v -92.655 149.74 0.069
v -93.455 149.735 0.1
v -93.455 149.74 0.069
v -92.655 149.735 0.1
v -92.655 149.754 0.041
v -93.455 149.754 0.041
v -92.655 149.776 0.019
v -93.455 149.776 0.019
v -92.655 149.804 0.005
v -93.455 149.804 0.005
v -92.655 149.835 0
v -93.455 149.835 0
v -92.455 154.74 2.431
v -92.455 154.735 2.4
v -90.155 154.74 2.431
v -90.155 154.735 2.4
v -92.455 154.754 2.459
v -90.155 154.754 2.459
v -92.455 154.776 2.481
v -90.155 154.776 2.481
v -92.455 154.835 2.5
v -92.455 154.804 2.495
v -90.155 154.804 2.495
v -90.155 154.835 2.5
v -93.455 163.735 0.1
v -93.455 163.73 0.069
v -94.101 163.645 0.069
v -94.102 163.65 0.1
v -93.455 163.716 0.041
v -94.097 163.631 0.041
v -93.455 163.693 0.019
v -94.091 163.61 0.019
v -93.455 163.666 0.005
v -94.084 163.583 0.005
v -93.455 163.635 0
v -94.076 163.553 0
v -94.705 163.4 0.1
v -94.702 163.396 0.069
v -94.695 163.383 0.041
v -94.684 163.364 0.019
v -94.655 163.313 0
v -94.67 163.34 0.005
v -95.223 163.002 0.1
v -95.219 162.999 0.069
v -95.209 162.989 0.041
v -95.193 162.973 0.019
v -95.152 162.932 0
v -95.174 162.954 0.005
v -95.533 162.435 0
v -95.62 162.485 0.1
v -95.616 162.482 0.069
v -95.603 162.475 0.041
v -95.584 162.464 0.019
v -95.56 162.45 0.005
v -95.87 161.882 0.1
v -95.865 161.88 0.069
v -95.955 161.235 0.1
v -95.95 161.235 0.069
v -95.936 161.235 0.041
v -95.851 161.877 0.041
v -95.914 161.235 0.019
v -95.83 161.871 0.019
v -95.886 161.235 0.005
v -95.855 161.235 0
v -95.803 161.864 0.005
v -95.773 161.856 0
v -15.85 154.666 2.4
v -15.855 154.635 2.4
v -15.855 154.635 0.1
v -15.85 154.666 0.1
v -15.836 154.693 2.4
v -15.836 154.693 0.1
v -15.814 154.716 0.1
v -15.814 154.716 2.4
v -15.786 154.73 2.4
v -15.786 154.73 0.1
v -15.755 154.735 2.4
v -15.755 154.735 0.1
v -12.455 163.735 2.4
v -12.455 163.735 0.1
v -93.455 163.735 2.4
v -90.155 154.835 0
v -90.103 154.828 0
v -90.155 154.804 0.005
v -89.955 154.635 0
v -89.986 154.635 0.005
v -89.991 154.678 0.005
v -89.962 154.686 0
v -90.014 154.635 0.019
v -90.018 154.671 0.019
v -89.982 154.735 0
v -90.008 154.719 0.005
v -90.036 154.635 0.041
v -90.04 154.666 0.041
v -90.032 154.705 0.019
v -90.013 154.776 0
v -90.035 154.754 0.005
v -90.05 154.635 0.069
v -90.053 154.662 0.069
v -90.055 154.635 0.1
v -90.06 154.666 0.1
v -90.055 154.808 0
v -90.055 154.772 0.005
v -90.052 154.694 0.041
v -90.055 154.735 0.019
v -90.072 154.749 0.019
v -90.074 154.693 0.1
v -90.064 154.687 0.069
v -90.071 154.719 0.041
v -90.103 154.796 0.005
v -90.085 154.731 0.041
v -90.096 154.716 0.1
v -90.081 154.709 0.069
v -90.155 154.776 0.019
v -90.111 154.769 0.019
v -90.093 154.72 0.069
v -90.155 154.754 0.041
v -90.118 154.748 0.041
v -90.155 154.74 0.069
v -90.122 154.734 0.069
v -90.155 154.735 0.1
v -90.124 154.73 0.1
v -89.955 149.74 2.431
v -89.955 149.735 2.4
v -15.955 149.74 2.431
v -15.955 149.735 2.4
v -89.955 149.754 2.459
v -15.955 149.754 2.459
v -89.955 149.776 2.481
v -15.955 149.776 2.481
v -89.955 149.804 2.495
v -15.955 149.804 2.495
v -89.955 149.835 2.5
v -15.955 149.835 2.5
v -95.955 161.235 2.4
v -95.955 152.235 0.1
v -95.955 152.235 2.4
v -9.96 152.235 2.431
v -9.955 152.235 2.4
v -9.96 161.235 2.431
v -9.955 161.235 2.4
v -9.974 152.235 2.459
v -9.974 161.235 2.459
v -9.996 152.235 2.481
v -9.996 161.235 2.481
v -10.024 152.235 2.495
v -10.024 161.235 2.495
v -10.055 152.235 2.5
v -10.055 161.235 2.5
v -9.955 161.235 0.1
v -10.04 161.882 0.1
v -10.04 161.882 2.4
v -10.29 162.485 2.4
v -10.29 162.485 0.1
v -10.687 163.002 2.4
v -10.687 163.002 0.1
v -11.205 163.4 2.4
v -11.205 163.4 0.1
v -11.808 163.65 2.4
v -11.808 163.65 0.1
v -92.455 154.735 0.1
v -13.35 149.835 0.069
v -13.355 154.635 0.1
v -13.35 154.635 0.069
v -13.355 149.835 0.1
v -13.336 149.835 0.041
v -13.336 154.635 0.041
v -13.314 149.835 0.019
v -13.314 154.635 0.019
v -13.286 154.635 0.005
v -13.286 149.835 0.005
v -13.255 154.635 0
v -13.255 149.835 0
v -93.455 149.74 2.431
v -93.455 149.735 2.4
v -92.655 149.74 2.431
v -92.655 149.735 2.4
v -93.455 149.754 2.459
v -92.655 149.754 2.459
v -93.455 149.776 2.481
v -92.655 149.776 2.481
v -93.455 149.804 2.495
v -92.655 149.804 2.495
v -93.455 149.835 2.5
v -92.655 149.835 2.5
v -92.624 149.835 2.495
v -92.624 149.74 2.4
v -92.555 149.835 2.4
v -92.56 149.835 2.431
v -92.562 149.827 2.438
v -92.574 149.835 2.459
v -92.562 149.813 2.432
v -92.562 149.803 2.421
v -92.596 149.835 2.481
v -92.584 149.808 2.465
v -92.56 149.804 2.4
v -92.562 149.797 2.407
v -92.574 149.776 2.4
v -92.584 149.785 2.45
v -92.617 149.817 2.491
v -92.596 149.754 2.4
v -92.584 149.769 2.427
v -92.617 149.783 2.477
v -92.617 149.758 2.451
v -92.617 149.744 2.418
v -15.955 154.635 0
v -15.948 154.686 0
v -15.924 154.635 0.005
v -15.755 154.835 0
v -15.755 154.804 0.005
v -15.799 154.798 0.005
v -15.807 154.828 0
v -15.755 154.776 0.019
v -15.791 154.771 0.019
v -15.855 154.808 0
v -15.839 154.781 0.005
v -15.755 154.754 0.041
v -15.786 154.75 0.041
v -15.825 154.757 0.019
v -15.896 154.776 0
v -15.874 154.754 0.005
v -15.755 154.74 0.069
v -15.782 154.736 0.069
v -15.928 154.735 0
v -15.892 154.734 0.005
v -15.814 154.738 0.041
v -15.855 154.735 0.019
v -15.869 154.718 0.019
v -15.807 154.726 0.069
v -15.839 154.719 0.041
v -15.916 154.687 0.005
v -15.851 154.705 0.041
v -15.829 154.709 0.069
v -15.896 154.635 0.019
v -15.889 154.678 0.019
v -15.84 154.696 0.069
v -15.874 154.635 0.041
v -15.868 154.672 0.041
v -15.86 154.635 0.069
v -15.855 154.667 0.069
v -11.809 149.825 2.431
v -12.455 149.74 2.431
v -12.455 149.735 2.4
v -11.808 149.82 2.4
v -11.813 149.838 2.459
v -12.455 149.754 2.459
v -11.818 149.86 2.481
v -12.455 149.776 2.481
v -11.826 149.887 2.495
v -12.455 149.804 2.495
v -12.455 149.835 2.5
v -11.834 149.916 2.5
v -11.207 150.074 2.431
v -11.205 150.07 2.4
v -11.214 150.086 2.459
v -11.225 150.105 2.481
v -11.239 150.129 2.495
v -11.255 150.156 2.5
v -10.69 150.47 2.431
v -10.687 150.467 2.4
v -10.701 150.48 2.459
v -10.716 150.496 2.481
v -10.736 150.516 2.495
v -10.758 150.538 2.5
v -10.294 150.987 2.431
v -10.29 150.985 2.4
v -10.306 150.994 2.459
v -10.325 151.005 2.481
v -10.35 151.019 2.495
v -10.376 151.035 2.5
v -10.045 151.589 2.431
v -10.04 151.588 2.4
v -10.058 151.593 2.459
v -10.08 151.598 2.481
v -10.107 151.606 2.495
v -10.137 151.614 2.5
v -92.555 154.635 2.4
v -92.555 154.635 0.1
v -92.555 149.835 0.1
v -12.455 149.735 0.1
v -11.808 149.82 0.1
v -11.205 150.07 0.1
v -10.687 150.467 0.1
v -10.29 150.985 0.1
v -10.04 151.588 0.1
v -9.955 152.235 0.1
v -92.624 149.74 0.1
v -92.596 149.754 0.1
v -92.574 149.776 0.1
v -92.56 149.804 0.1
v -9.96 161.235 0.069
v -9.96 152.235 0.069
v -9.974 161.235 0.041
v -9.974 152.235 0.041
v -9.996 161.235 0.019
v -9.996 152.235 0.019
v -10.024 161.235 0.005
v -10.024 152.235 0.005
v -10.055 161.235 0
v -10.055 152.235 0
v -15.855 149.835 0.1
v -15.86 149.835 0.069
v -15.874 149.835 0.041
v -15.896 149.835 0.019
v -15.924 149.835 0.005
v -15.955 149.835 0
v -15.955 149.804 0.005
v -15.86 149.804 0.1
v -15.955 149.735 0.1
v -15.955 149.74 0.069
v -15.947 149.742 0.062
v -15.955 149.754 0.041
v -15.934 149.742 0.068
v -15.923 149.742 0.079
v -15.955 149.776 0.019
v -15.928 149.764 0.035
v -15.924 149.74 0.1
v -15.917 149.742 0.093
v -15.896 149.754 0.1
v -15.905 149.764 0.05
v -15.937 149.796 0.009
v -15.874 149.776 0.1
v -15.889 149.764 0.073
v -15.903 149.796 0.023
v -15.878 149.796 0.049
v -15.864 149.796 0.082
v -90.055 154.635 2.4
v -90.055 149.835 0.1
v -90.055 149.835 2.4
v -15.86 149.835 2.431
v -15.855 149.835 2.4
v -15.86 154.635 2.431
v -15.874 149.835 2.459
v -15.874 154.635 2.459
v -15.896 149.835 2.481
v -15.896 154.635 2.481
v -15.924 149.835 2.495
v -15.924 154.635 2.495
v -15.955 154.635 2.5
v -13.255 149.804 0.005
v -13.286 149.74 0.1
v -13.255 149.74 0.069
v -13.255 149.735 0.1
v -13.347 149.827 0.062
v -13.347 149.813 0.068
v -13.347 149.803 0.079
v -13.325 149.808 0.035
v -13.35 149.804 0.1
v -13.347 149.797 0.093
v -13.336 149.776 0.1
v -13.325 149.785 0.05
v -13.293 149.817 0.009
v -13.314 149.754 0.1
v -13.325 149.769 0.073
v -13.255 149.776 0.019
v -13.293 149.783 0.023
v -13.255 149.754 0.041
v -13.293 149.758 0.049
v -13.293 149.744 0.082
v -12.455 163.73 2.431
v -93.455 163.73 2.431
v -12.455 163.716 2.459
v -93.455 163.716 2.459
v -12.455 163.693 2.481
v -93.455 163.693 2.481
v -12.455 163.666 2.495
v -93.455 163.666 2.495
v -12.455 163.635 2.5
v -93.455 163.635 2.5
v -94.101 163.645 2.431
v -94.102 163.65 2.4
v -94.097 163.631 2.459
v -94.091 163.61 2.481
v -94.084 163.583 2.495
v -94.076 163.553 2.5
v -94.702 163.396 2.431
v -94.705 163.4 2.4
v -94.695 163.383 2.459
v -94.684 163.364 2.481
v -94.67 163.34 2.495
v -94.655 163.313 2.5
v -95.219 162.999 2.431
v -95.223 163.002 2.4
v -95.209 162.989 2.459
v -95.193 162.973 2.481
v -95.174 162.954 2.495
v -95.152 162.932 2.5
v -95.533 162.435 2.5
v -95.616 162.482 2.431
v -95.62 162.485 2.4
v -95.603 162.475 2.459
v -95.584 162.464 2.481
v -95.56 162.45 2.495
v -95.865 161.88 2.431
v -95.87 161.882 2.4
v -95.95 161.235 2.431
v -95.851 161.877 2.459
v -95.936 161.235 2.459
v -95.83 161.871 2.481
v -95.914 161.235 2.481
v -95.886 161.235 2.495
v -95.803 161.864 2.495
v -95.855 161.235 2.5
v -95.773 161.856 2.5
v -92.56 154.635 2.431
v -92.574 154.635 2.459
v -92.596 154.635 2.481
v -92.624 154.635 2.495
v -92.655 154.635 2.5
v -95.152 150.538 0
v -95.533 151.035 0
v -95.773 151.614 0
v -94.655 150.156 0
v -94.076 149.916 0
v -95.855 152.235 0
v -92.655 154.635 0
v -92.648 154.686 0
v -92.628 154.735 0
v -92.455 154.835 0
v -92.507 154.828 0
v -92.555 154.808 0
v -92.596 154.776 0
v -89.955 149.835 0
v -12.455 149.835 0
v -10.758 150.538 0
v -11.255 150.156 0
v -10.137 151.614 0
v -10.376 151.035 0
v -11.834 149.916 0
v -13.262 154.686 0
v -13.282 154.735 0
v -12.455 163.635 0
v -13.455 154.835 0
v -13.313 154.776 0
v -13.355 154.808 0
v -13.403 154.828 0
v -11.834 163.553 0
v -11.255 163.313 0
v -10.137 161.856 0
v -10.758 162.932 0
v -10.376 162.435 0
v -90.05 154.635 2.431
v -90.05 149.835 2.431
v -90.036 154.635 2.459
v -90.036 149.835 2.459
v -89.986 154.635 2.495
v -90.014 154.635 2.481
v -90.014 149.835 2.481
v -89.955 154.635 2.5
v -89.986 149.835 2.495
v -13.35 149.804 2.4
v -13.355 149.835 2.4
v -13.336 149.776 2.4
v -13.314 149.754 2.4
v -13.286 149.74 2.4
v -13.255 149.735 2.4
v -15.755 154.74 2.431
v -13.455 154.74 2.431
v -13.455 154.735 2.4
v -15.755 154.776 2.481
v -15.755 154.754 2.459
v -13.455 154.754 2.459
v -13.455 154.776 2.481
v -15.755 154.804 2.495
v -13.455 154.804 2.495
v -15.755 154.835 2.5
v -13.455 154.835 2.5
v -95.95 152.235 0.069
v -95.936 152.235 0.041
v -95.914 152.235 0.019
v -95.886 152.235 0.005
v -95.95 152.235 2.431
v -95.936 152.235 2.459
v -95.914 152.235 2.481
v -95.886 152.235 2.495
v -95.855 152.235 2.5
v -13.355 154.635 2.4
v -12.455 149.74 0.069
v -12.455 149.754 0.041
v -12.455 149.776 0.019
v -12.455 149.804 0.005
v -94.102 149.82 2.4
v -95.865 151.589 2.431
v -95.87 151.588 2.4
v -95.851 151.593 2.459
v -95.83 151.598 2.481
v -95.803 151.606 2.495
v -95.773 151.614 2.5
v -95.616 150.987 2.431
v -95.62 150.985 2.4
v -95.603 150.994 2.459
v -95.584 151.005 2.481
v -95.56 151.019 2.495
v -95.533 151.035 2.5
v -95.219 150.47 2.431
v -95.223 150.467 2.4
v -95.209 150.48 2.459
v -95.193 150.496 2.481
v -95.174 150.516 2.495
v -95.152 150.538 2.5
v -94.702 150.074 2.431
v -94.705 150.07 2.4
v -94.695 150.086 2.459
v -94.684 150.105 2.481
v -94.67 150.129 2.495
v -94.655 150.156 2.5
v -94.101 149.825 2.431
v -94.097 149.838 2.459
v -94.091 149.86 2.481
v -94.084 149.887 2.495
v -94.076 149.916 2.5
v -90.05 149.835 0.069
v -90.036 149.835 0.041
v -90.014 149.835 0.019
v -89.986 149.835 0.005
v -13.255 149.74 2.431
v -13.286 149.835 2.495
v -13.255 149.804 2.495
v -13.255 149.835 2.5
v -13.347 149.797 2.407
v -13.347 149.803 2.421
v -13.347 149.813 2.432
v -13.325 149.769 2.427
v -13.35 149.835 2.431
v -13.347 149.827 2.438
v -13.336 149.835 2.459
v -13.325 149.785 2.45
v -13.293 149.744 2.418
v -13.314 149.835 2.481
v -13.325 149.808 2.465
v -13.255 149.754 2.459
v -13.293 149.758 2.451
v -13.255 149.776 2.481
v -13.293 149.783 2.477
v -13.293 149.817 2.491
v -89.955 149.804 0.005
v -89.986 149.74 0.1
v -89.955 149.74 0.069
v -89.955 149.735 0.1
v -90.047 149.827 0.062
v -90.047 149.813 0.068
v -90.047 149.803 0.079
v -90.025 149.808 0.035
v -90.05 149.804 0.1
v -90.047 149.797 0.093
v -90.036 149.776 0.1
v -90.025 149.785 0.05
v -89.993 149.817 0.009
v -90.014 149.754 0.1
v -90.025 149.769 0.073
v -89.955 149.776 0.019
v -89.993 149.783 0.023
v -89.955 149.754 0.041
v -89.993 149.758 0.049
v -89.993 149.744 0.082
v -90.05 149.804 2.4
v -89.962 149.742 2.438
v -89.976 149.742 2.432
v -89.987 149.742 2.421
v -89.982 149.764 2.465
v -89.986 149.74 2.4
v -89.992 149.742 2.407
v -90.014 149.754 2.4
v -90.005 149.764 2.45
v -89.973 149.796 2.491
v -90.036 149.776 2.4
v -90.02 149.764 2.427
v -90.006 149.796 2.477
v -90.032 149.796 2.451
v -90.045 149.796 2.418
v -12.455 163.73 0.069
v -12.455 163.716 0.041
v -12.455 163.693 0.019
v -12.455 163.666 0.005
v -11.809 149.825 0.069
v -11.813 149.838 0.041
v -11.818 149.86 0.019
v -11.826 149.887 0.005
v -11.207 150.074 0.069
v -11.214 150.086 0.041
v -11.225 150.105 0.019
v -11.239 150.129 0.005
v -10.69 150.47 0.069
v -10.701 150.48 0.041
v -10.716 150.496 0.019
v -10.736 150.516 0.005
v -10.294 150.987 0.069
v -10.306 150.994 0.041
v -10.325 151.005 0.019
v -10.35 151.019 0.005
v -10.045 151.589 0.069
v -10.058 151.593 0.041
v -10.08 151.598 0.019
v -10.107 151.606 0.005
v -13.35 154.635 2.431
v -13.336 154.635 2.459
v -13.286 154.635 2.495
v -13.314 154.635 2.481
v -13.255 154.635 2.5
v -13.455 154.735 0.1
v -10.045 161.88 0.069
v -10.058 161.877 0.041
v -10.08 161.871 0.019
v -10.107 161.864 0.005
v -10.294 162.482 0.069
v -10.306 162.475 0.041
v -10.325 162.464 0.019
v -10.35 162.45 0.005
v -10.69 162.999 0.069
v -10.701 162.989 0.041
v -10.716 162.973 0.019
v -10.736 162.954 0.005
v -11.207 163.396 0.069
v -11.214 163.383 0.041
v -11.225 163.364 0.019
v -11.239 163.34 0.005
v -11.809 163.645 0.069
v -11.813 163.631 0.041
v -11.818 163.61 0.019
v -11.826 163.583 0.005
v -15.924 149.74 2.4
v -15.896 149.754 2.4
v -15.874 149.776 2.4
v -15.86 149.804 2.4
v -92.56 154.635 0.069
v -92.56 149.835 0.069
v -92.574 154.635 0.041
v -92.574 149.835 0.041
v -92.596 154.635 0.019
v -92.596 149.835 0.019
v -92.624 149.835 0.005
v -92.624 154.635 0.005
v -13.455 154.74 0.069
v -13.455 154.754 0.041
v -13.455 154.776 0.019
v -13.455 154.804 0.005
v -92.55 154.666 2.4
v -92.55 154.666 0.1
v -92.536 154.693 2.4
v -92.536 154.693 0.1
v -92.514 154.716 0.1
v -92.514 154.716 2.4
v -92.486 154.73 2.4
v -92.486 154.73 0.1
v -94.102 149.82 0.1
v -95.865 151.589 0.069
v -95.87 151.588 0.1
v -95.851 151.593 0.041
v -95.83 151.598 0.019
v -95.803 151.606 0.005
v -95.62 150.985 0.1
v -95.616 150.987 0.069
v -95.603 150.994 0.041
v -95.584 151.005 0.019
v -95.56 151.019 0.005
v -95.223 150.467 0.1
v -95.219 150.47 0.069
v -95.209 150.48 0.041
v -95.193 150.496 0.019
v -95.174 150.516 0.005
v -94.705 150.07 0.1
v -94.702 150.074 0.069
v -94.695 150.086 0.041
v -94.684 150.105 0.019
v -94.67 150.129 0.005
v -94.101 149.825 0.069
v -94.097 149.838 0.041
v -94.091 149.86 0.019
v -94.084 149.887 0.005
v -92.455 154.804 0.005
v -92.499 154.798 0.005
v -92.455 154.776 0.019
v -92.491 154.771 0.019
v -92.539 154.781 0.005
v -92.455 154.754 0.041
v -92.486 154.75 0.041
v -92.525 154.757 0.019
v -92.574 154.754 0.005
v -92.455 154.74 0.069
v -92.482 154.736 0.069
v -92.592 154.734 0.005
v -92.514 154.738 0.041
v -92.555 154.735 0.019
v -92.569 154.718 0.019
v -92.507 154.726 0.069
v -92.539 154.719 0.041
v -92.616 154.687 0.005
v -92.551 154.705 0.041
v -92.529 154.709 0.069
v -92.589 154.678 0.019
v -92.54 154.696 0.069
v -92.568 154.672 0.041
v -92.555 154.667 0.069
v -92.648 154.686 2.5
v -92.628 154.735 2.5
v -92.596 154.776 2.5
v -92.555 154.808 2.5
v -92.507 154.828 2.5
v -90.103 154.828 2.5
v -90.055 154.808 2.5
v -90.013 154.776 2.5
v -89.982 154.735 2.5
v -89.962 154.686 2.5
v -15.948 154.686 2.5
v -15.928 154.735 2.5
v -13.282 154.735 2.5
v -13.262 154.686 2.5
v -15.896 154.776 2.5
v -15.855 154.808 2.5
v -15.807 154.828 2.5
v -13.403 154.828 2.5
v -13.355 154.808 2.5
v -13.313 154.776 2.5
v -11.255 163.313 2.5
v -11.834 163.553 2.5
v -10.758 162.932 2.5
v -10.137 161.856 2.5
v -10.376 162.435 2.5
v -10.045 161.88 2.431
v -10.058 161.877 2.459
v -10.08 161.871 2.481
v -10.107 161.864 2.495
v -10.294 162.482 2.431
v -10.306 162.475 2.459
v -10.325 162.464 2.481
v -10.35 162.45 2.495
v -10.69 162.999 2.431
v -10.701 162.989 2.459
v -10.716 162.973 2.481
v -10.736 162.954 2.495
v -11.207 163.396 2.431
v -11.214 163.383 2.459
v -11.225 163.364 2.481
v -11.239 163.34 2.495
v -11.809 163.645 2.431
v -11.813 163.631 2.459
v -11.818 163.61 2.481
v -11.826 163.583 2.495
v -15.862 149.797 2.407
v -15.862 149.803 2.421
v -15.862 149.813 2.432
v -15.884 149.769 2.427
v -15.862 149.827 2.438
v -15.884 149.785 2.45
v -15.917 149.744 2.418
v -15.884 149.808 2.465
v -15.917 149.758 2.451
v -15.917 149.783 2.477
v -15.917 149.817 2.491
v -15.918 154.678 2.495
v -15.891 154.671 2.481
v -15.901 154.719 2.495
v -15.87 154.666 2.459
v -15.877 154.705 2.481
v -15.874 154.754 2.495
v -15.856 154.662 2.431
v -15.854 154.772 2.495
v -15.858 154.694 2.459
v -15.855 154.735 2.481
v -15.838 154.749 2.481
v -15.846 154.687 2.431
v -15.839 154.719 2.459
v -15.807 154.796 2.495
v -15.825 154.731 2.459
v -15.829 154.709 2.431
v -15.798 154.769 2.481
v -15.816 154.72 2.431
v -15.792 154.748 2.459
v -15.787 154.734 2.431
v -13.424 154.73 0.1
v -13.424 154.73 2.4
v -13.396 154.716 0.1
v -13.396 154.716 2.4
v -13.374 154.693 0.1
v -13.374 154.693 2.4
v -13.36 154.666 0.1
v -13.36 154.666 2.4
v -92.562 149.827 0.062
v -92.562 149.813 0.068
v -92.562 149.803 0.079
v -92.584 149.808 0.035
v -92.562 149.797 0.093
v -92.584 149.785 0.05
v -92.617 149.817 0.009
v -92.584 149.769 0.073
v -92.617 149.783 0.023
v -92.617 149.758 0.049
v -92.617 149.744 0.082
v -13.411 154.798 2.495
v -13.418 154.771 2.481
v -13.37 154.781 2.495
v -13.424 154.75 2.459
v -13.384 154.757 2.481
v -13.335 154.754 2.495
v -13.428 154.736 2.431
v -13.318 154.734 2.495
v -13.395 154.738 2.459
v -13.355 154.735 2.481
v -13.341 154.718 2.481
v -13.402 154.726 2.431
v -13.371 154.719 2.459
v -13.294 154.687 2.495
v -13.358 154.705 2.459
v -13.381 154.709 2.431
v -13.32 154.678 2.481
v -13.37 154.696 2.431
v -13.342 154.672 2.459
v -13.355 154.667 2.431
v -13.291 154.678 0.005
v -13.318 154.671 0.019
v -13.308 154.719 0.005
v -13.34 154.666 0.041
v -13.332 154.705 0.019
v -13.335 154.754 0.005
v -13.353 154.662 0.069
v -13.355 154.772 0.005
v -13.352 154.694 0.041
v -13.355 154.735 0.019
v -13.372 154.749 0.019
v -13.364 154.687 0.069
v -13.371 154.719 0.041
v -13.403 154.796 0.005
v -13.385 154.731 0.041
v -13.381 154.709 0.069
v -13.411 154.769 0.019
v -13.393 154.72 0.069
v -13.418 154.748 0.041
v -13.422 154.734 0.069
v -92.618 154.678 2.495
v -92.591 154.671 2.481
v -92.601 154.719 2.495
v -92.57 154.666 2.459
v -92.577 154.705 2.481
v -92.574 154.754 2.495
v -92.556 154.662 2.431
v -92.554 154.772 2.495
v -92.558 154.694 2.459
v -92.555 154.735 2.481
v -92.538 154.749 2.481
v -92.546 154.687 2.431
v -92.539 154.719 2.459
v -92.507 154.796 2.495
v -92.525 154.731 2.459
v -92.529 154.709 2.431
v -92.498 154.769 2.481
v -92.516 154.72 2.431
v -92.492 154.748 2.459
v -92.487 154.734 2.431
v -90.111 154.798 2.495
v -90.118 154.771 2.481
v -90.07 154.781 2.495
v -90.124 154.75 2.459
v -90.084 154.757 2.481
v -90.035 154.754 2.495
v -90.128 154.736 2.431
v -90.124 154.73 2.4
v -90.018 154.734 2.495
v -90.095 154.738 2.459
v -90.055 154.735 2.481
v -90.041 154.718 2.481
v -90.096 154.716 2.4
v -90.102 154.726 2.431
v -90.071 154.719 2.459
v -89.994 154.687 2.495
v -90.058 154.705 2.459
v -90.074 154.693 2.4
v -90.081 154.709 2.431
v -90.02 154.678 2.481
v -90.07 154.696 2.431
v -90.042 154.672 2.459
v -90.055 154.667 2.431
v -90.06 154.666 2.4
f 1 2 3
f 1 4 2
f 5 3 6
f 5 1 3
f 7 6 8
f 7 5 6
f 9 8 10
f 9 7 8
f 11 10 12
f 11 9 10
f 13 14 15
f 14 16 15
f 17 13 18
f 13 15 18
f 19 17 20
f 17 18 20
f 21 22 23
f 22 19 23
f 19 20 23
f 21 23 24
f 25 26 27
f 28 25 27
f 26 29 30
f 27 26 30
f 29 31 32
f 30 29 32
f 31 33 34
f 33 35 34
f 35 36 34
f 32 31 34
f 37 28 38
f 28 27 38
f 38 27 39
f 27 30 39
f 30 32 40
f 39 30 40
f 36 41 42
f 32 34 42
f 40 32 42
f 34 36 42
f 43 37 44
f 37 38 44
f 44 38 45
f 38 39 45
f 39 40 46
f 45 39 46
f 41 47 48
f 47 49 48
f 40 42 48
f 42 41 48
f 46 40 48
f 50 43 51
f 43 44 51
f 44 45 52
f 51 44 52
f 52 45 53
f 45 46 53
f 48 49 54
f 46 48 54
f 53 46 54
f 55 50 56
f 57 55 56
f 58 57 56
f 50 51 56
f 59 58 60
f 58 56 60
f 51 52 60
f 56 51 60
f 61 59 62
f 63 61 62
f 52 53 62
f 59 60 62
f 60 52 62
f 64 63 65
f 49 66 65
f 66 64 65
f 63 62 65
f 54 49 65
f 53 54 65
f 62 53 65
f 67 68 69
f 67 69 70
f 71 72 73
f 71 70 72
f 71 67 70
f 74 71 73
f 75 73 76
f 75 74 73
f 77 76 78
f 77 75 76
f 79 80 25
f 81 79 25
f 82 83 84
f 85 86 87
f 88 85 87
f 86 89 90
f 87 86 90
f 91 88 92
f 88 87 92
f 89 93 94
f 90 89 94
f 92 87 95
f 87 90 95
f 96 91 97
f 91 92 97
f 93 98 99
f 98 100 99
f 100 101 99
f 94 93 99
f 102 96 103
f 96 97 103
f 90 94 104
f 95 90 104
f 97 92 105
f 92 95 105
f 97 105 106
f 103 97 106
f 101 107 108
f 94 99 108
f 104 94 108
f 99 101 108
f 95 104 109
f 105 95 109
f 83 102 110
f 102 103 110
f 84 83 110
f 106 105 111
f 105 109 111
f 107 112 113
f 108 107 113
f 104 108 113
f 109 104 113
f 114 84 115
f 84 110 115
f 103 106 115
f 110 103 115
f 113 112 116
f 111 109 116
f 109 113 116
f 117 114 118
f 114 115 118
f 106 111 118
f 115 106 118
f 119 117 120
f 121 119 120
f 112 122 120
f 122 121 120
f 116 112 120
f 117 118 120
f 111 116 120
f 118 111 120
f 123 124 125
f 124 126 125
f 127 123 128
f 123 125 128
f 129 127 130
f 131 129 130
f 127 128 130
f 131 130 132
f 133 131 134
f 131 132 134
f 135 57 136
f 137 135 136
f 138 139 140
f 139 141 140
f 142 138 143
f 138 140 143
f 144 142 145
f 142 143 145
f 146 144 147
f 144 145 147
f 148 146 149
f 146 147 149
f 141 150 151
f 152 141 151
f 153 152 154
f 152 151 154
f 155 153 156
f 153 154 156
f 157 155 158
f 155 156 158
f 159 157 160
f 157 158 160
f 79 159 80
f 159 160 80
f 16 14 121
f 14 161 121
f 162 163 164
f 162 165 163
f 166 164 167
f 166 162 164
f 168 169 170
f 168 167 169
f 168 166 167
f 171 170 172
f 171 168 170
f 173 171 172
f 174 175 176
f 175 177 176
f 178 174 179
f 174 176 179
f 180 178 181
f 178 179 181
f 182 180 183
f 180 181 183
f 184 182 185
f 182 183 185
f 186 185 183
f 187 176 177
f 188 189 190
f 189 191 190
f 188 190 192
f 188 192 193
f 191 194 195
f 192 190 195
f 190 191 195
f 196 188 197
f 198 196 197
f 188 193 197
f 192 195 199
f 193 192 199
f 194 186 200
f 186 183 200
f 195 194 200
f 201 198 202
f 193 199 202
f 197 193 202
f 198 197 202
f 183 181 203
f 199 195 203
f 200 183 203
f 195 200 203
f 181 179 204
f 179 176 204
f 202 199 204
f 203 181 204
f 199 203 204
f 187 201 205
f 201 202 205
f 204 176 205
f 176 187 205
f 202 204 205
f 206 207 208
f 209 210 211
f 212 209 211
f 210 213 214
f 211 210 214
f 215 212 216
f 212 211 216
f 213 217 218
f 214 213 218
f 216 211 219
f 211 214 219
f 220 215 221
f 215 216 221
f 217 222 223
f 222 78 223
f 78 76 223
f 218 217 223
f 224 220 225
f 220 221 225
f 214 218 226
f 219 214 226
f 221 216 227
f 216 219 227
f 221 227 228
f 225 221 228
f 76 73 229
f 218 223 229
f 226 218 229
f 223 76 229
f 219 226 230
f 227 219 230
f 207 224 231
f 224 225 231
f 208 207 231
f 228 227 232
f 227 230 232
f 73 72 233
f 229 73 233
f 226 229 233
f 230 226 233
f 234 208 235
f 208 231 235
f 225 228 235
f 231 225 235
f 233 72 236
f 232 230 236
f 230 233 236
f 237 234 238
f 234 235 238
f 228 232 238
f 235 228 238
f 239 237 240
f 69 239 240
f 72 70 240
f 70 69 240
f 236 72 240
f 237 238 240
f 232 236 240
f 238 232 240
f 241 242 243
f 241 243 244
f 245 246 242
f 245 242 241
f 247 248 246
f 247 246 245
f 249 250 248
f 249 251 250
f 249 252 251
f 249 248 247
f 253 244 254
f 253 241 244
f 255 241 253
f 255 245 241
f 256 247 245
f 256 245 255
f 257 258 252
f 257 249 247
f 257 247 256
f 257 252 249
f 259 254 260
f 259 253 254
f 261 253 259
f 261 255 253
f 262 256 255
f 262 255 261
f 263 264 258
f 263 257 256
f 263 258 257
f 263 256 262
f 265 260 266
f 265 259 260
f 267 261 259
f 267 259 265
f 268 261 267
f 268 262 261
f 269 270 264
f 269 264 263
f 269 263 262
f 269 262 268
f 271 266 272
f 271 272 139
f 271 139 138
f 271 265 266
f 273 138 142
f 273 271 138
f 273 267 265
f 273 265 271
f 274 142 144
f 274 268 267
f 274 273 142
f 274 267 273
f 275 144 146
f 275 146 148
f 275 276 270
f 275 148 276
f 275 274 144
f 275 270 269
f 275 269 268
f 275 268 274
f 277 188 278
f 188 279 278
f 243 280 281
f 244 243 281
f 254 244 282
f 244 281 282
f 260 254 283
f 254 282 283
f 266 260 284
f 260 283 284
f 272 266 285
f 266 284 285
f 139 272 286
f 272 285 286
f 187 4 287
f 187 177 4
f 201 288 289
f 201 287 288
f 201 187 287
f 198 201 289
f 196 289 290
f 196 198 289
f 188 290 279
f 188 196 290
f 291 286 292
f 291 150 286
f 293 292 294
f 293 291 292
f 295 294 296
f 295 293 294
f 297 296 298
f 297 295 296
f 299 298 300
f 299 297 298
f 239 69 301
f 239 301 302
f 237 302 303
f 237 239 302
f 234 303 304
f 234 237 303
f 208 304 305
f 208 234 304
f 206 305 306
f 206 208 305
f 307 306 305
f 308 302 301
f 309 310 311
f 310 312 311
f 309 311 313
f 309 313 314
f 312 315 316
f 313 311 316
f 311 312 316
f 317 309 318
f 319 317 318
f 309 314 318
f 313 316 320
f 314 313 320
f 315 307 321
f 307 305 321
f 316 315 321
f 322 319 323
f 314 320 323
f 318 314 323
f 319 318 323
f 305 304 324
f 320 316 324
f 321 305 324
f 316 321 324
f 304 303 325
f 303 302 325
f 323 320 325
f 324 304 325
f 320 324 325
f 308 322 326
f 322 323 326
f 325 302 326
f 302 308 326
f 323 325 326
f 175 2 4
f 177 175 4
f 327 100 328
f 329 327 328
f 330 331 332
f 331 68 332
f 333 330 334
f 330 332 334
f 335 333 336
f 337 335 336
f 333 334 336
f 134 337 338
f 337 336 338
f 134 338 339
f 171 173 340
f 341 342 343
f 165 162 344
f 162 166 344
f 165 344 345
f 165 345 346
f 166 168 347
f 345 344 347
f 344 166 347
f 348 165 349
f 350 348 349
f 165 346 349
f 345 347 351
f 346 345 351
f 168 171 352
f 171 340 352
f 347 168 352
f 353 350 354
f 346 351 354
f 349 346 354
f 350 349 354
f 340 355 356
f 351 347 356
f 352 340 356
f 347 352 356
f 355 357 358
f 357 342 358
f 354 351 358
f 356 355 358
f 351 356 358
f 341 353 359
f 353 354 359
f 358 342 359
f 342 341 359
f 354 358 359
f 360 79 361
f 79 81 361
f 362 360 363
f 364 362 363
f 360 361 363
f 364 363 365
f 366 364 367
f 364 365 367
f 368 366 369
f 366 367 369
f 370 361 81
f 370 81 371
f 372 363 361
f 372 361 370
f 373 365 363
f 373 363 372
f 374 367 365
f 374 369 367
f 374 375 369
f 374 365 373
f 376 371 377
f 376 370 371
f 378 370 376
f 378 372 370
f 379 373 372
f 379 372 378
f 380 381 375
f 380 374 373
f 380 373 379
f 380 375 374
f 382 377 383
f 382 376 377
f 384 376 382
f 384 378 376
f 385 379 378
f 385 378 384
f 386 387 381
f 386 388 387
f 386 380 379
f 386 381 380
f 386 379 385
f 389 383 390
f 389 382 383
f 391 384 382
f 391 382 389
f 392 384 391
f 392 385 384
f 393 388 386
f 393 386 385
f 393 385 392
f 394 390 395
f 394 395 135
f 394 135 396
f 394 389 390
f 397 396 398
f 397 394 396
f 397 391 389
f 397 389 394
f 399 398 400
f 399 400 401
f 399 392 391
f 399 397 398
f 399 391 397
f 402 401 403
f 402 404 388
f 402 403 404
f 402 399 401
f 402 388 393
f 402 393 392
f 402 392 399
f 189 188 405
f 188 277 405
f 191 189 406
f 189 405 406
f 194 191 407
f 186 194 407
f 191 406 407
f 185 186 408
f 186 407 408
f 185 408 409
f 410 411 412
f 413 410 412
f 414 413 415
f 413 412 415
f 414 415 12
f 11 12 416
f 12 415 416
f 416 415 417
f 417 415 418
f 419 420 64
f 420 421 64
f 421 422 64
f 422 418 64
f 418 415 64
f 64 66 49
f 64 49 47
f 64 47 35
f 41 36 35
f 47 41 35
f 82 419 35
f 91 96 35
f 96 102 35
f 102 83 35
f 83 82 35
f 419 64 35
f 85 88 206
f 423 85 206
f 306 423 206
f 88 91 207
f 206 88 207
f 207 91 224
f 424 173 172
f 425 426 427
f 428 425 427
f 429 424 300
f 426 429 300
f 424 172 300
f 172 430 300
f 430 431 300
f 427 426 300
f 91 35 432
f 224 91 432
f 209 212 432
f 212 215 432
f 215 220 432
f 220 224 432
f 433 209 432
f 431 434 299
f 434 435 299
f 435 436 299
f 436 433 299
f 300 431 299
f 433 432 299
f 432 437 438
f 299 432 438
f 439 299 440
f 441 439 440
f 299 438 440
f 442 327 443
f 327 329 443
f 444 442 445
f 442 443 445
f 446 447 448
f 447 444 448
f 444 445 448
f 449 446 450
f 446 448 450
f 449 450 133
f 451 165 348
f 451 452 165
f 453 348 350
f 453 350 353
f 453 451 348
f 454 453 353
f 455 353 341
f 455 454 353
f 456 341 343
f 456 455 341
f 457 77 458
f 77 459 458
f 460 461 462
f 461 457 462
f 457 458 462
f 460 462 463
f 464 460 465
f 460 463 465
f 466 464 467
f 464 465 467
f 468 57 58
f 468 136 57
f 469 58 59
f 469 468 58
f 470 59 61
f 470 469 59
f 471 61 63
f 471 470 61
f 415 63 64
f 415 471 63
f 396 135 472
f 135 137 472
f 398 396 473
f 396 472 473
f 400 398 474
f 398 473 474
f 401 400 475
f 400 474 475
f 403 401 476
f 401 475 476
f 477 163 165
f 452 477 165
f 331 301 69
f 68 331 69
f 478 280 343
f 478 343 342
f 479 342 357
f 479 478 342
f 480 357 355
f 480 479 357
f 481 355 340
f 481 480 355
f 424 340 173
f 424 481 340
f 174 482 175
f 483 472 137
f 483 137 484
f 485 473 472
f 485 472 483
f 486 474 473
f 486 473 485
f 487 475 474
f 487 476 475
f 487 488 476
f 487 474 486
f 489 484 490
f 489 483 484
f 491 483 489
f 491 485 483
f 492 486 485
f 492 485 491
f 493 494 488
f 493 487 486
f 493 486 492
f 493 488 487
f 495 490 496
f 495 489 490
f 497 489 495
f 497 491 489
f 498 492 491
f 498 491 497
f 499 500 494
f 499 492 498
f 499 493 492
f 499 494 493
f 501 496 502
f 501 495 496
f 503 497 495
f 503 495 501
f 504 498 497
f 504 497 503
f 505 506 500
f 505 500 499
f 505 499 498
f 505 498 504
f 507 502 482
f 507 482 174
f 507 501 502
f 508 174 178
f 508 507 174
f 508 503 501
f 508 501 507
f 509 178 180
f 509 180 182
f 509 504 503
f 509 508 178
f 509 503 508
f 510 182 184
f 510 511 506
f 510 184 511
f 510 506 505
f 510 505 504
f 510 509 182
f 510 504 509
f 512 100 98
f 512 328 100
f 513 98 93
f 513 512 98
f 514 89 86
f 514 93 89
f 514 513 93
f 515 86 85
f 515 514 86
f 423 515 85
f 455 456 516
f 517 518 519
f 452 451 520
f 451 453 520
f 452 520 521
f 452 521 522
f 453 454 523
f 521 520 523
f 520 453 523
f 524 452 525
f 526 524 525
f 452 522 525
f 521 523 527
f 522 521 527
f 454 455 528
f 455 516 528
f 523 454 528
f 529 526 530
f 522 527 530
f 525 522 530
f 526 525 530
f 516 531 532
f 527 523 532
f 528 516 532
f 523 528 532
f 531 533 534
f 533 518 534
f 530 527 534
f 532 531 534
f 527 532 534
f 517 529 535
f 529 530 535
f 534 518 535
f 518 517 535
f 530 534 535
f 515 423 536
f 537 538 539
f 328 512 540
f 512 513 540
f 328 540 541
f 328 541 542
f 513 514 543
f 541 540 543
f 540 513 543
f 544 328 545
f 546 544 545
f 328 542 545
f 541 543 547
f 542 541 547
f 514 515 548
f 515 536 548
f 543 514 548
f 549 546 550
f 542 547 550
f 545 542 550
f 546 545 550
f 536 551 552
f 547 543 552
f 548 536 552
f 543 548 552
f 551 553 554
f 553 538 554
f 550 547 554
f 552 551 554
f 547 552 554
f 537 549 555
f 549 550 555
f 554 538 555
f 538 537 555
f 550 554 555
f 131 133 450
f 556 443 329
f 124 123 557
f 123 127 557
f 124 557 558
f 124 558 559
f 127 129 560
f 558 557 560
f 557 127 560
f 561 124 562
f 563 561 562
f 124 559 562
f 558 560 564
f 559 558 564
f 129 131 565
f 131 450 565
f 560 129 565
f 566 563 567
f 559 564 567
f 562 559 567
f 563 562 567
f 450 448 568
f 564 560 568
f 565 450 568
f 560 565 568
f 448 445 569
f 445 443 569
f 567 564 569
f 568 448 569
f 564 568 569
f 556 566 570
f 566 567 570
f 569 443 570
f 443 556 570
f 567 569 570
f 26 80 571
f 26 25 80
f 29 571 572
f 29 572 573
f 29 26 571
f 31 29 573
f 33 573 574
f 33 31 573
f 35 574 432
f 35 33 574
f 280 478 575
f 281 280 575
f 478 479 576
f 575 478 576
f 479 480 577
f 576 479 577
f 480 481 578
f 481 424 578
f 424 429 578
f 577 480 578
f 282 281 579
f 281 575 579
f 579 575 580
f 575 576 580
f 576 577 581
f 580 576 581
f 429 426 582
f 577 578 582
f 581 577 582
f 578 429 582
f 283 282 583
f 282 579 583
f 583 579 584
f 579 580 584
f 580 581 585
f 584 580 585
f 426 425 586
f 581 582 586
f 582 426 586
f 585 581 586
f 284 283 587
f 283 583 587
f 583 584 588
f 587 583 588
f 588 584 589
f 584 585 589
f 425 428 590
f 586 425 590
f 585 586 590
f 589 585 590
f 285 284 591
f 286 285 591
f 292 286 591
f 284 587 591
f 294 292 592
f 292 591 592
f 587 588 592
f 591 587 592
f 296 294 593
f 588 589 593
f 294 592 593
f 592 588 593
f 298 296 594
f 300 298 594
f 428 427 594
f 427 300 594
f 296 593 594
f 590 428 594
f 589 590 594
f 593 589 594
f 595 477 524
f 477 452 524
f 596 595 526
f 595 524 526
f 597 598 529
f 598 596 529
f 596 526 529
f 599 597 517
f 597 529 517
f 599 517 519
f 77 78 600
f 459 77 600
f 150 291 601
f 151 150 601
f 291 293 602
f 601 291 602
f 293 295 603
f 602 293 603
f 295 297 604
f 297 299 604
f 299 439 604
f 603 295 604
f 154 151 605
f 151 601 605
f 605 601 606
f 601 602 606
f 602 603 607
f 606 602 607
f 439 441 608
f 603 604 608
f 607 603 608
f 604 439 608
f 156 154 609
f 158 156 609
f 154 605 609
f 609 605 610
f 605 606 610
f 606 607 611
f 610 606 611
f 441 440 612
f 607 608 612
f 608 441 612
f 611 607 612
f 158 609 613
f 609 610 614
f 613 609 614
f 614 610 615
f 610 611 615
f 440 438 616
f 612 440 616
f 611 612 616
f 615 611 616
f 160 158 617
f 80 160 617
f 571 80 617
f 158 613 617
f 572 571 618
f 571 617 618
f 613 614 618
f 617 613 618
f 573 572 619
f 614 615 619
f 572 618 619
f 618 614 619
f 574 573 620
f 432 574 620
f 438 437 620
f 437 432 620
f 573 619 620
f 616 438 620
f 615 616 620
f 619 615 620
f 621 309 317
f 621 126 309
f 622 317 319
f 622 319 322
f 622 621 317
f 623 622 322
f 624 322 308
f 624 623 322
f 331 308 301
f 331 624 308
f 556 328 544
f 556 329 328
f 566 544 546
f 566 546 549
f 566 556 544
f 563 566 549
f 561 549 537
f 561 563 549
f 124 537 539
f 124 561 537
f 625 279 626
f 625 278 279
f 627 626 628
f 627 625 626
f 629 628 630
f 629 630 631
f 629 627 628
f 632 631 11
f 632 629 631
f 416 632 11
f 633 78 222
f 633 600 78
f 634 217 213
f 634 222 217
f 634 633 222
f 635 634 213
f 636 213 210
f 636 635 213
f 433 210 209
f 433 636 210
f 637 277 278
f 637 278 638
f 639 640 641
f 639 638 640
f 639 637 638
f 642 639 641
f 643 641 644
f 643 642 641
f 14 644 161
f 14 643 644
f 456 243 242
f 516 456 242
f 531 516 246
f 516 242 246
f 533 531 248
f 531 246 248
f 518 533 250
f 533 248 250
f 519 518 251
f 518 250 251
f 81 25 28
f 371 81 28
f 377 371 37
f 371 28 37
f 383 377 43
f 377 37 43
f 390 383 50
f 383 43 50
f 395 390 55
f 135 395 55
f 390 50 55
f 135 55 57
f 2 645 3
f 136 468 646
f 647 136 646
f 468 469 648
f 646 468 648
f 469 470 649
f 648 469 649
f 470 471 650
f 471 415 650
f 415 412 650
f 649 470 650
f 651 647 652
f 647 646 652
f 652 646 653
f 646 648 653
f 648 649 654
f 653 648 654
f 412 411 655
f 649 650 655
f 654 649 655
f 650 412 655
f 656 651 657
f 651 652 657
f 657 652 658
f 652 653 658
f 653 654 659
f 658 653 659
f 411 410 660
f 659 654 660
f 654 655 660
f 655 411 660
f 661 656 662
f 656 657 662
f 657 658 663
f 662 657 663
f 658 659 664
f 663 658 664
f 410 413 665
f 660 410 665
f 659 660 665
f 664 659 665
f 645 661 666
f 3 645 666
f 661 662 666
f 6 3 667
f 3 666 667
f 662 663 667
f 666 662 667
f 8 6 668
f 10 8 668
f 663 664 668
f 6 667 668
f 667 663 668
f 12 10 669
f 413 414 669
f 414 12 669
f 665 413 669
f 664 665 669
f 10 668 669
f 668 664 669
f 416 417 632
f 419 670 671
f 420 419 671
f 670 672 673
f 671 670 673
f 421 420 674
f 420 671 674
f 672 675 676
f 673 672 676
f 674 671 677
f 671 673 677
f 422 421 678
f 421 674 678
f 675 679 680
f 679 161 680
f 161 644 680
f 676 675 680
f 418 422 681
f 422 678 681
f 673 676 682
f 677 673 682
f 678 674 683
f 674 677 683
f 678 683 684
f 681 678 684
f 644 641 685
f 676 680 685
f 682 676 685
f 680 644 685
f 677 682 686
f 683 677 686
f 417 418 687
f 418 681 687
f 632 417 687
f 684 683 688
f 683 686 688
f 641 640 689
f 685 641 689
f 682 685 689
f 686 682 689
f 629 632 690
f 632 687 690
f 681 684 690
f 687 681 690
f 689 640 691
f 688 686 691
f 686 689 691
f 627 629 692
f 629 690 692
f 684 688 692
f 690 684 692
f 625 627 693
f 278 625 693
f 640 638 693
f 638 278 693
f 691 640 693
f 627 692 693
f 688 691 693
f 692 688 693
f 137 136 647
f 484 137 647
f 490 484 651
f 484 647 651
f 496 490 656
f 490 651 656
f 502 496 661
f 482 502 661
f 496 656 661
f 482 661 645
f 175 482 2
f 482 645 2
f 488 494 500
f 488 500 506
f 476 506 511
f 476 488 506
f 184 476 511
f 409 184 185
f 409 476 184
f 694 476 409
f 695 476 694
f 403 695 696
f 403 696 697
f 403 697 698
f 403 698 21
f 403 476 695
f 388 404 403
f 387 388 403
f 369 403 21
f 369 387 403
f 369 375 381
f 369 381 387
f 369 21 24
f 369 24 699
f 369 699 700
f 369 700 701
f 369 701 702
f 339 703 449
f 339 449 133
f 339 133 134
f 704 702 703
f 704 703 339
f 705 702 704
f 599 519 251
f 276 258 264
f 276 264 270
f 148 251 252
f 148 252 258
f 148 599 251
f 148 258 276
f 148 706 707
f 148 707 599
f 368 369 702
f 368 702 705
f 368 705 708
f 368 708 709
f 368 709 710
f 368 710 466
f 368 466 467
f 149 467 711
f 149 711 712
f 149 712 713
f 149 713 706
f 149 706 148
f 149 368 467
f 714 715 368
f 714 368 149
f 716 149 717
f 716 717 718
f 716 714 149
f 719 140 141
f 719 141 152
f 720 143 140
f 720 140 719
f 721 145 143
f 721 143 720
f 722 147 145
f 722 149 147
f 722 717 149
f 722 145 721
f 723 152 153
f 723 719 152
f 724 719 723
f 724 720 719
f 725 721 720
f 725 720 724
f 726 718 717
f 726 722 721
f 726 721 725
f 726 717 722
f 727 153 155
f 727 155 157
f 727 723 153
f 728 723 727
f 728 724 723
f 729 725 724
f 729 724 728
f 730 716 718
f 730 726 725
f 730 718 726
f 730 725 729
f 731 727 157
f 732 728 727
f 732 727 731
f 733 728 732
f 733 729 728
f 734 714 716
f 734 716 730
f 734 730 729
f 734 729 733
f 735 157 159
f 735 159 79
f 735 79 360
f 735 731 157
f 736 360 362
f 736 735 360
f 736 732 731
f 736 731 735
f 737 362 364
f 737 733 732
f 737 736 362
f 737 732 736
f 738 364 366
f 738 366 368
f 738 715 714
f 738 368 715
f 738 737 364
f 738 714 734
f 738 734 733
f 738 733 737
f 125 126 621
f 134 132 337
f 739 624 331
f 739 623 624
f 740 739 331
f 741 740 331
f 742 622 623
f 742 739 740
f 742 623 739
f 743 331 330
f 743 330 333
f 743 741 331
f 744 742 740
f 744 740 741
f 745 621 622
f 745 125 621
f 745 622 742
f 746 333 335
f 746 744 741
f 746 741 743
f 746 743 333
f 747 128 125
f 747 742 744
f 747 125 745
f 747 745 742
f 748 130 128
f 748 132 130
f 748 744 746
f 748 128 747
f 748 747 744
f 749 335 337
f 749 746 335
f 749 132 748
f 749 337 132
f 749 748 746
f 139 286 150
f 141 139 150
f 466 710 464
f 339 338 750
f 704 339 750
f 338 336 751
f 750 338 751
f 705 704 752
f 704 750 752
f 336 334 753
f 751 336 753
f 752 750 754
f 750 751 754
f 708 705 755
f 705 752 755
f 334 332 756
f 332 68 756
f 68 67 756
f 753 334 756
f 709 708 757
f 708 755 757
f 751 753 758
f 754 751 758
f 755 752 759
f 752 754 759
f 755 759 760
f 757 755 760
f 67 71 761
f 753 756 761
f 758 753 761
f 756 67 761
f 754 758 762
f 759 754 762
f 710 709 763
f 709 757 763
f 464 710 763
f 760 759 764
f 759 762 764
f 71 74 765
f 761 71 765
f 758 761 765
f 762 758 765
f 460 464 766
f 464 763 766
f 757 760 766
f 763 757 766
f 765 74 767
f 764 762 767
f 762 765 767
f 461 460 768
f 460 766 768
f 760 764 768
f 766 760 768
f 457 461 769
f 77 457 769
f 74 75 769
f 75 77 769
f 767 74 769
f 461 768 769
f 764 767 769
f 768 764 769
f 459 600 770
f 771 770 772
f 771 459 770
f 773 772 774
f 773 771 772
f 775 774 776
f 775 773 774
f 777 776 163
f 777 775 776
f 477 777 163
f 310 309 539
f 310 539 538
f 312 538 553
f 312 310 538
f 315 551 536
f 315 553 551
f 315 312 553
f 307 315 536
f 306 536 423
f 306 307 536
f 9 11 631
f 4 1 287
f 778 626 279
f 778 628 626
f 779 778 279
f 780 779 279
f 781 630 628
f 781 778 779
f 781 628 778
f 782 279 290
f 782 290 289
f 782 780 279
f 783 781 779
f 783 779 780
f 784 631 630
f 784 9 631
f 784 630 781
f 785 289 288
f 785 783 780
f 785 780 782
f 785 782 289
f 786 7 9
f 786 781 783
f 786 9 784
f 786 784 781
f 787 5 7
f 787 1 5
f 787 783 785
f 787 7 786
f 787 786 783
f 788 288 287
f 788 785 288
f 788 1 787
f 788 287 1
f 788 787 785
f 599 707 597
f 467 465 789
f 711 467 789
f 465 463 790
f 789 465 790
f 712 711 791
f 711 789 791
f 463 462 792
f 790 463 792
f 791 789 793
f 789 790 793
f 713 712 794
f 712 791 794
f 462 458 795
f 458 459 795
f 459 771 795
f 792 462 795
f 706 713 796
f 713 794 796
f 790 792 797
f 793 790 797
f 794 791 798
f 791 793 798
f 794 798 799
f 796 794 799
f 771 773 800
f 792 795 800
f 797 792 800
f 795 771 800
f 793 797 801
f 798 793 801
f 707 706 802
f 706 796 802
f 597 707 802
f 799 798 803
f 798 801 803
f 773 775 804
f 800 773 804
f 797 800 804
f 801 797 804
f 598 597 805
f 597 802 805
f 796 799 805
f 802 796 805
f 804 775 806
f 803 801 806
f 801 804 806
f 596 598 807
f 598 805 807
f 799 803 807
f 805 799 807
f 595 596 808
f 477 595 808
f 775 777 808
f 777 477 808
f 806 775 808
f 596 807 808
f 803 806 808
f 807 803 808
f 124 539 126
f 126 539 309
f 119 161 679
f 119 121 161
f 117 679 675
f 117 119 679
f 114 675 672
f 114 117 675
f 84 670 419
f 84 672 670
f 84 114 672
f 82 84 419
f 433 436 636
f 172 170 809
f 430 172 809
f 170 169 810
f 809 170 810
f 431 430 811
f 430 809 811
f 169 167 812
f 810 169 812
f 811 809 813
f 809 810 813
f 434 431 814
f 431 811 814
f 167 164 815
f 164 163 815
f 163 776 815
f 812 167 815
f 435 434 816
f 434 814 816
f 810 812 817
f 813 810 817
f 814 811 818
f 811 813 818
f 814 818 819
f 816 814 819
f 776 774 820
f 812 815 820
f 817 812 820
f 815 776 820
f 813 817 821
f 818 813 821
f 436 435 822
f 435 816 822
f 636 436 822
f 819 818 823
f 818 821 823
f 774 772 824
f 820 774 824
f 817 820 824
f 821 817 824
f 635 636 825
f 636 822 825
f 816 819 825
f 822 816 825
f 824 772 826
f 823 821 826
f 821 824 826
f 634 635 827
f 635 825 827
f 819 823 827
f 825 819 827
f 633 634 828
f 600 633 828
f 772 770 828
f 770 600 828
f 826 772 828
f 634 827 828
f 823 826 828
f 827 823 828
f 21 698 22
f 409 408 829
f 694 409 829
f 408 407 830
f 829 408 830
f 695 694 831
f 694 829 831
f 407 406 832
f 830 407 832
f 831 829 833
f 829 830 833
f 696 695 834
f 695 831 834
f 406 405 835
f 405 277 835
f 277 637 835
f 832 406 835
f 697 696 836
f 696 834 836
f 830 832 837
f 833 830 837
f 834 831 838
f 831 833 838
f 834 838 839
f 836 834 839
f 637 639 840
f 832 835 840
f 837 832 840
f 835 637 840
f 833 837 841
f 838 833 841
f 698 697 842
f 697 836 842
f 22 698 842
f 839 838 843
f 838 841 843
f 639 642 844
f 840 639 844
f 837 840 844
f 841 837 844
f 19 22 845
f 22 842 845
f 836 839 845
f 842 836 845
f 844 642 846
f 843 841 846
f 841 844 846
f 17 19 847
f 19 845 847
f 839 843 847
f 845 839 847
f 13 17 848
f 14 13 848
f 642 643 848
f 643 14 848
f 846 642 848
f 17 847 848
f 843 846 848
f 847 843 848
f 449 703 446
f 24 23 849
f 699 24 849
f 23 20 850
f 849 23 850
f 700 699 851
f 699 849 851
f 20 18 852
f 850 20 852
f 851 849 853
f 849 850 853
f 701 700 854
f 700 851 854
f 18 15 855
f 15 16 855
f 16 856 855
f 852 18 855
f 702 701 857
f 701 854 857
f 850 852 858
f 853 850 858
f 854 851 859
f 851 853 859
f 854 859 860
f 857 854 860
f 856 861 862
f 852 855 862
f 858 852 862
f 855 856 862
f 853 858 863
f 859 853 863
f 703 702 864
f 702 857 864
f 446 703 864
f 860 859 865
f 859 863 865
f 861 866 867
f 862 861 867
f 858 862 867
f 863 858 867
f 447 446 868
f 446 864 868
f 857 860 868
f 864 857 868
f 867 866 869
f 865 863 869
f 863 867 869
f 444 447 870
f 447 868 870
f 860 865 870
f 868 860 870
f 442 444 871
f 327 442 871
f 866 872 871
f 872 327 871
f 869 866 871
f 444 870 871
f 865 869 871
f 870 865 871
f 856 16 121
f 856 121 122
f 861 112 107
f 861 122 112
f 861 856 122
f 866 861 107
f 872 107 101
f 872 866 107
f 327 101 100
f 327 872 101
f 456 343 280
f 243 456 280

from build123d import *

# Parameters (mm, degrees)
RESSALTO_EXTRUS_O1_DEPTH = 2.5
FILETE1_R                = 0.1


with BuildPart() as part:
    # Esboço1 → Ressalto-extrusão1 (new body)
    with BuildSketch(Plane.XY):
        with BuildLine():
            Line((-12.454787307, 163.73471538), (-93.454787307, 163.73471538))
            ThreePointArc((-93.454787307, 163.73471538), (-95.22255426, 163.002482333), (-95.954787307, 161.23471538))
            Line((-95.954787307, 161.23471538), (-95.954787307, 152.23471538))
            ThreePointArc((-95.954787307, 152.23471538), (-95.22255426, 150.466948427), (-93.454787307, 149.73471538))
            Line((-93.454787307, 149.73471538), (-92.554787307, 149.73471538))
            Line((-92.554787307, 149.73471538), (-92.554787307, 154.73471538))
            Line((-92.554787307, 154.73471538), (-90.054787307, 154.73471538))
            Line((-90.054787307, 154.73471538), (-90.054787307, 149.73471538))
            Line((-90.054787307, 149.73471538), (-66.954787307, 149.73471538))
            Line((-66.954787307, 149.73471538), (-64.454787307, 149.73471538))
            Line((-64.454787307, 149.73471538), (-41.454787307, 149.73471538))
            Line((-41.454787307, 149.73471538), (-38.954787307, 149.73471538))
            Line((-38.954787307, 149.73471538), (-15.854787307, 149.73471538))
            Line((-15.854787307, 149.73471538), (-15.854787307, 154.73471538))
            Line((-15.854787307, 154.73471538), (-13.354787307, 154.73471538))
            Line((-13.354787307, 154.73471538), (-13.354787307, 149.73471538))
            Line((-13.354787307, 149.73471538), (-12.454787307, 149.73471538))
            ThreePointArc((-12.454787307, 149.73471538), (-10.687020354, 150.466948427), (-9.954787307, 152.23471538))
            Line((-9.954787307, 152.23471538), (-9.954787307, 161.23471538))
            ThreePointArc((-9.954787307, 161.23471538), (-10.687020354, 163.002482333), (-12.454787307, 163.73471538))
        make_face()
    extrude(amount=RESSALTO_EXTRUS_O1_DEPTH)

    # Filete1
    filete1_edges = [part.edges().sort_by_distance(p)[0] for p in [
        (-93.004787307, 149.73471538, 2.5),
        (-95.22255426, 163.002482333, 0),
        (-52.954787307, 163.73471538, 0),
        (-92.554787307, 152.23471538, 2.5),
        (-10.687020354, 163.002482333, 0),
        (-9.954787307, 156.73471538, 0),
        (-10.687020354, 150.466948427, 0),
        (-12.904787307, 149.73471538, 0),
        (-13.354787307, 152.23471538, 0),
        (-14.604787307, 154.73471538, 0),
        (-15.854787307, 152.23471538, 0),
        (-52.954787307, 149.73471538, 0),
        (-91.304787307, 154.73471538, 2.5),
        (-90.054787307, 152.23471538, 0),
        (-91.304787307, 154.73471538, 0),
        (-92.554787307, 152.23471538, 0),
        (-93.004787307, 149.73471538, 0),
        (-95.22255426, 150.466948427, 0),
        (-95.954787307, 156.73471538, 0),
        (-90.054787307, 152.23471538, 2.5),
        (-52.954787307, 149.73471538, 2.5),
        (-13.354787307, 149.73471538, 1.25),
        (-13.354787307, 154.73471538, 1.25),
        (-15.854787307, 154.73471538, 1.25),
        (-15.854787307, 149.73471538, 1.25),
        (-90.054787307, 149.73471538, 1.25),
        (-90.054787307, 154.73471538, 1.25),
        (-92.554787307, 154.73471538, 1.25),
        (-92.554787307, 149.73471538, 1.25),
        (-15.854787307, 152.23471538, 2.5),
        (-14.604787307, 154.73471538, 2.5),
        (-13.354787307, 152.23471538, 2.5),
        (-12.904787307, 149.73471538, 2.5),
        (-10.687020354, 150.466948427, 2.5),
        (-95.954787307, 156.73471538, 2.5),
        (-9.954787307, 156.73471538, 2.5),
        (-10.687020354, 163.002482333, 2.5),
        (-52.954787307, 163.73471538, 2.5),
        (-95.22255426, 163.002482333, 2.5),
        (-95.22255426, 150.466948427, 2.5),
    ]]
    fillet(filete1_edges, radius=FILETE1_R)


solid = part.part
